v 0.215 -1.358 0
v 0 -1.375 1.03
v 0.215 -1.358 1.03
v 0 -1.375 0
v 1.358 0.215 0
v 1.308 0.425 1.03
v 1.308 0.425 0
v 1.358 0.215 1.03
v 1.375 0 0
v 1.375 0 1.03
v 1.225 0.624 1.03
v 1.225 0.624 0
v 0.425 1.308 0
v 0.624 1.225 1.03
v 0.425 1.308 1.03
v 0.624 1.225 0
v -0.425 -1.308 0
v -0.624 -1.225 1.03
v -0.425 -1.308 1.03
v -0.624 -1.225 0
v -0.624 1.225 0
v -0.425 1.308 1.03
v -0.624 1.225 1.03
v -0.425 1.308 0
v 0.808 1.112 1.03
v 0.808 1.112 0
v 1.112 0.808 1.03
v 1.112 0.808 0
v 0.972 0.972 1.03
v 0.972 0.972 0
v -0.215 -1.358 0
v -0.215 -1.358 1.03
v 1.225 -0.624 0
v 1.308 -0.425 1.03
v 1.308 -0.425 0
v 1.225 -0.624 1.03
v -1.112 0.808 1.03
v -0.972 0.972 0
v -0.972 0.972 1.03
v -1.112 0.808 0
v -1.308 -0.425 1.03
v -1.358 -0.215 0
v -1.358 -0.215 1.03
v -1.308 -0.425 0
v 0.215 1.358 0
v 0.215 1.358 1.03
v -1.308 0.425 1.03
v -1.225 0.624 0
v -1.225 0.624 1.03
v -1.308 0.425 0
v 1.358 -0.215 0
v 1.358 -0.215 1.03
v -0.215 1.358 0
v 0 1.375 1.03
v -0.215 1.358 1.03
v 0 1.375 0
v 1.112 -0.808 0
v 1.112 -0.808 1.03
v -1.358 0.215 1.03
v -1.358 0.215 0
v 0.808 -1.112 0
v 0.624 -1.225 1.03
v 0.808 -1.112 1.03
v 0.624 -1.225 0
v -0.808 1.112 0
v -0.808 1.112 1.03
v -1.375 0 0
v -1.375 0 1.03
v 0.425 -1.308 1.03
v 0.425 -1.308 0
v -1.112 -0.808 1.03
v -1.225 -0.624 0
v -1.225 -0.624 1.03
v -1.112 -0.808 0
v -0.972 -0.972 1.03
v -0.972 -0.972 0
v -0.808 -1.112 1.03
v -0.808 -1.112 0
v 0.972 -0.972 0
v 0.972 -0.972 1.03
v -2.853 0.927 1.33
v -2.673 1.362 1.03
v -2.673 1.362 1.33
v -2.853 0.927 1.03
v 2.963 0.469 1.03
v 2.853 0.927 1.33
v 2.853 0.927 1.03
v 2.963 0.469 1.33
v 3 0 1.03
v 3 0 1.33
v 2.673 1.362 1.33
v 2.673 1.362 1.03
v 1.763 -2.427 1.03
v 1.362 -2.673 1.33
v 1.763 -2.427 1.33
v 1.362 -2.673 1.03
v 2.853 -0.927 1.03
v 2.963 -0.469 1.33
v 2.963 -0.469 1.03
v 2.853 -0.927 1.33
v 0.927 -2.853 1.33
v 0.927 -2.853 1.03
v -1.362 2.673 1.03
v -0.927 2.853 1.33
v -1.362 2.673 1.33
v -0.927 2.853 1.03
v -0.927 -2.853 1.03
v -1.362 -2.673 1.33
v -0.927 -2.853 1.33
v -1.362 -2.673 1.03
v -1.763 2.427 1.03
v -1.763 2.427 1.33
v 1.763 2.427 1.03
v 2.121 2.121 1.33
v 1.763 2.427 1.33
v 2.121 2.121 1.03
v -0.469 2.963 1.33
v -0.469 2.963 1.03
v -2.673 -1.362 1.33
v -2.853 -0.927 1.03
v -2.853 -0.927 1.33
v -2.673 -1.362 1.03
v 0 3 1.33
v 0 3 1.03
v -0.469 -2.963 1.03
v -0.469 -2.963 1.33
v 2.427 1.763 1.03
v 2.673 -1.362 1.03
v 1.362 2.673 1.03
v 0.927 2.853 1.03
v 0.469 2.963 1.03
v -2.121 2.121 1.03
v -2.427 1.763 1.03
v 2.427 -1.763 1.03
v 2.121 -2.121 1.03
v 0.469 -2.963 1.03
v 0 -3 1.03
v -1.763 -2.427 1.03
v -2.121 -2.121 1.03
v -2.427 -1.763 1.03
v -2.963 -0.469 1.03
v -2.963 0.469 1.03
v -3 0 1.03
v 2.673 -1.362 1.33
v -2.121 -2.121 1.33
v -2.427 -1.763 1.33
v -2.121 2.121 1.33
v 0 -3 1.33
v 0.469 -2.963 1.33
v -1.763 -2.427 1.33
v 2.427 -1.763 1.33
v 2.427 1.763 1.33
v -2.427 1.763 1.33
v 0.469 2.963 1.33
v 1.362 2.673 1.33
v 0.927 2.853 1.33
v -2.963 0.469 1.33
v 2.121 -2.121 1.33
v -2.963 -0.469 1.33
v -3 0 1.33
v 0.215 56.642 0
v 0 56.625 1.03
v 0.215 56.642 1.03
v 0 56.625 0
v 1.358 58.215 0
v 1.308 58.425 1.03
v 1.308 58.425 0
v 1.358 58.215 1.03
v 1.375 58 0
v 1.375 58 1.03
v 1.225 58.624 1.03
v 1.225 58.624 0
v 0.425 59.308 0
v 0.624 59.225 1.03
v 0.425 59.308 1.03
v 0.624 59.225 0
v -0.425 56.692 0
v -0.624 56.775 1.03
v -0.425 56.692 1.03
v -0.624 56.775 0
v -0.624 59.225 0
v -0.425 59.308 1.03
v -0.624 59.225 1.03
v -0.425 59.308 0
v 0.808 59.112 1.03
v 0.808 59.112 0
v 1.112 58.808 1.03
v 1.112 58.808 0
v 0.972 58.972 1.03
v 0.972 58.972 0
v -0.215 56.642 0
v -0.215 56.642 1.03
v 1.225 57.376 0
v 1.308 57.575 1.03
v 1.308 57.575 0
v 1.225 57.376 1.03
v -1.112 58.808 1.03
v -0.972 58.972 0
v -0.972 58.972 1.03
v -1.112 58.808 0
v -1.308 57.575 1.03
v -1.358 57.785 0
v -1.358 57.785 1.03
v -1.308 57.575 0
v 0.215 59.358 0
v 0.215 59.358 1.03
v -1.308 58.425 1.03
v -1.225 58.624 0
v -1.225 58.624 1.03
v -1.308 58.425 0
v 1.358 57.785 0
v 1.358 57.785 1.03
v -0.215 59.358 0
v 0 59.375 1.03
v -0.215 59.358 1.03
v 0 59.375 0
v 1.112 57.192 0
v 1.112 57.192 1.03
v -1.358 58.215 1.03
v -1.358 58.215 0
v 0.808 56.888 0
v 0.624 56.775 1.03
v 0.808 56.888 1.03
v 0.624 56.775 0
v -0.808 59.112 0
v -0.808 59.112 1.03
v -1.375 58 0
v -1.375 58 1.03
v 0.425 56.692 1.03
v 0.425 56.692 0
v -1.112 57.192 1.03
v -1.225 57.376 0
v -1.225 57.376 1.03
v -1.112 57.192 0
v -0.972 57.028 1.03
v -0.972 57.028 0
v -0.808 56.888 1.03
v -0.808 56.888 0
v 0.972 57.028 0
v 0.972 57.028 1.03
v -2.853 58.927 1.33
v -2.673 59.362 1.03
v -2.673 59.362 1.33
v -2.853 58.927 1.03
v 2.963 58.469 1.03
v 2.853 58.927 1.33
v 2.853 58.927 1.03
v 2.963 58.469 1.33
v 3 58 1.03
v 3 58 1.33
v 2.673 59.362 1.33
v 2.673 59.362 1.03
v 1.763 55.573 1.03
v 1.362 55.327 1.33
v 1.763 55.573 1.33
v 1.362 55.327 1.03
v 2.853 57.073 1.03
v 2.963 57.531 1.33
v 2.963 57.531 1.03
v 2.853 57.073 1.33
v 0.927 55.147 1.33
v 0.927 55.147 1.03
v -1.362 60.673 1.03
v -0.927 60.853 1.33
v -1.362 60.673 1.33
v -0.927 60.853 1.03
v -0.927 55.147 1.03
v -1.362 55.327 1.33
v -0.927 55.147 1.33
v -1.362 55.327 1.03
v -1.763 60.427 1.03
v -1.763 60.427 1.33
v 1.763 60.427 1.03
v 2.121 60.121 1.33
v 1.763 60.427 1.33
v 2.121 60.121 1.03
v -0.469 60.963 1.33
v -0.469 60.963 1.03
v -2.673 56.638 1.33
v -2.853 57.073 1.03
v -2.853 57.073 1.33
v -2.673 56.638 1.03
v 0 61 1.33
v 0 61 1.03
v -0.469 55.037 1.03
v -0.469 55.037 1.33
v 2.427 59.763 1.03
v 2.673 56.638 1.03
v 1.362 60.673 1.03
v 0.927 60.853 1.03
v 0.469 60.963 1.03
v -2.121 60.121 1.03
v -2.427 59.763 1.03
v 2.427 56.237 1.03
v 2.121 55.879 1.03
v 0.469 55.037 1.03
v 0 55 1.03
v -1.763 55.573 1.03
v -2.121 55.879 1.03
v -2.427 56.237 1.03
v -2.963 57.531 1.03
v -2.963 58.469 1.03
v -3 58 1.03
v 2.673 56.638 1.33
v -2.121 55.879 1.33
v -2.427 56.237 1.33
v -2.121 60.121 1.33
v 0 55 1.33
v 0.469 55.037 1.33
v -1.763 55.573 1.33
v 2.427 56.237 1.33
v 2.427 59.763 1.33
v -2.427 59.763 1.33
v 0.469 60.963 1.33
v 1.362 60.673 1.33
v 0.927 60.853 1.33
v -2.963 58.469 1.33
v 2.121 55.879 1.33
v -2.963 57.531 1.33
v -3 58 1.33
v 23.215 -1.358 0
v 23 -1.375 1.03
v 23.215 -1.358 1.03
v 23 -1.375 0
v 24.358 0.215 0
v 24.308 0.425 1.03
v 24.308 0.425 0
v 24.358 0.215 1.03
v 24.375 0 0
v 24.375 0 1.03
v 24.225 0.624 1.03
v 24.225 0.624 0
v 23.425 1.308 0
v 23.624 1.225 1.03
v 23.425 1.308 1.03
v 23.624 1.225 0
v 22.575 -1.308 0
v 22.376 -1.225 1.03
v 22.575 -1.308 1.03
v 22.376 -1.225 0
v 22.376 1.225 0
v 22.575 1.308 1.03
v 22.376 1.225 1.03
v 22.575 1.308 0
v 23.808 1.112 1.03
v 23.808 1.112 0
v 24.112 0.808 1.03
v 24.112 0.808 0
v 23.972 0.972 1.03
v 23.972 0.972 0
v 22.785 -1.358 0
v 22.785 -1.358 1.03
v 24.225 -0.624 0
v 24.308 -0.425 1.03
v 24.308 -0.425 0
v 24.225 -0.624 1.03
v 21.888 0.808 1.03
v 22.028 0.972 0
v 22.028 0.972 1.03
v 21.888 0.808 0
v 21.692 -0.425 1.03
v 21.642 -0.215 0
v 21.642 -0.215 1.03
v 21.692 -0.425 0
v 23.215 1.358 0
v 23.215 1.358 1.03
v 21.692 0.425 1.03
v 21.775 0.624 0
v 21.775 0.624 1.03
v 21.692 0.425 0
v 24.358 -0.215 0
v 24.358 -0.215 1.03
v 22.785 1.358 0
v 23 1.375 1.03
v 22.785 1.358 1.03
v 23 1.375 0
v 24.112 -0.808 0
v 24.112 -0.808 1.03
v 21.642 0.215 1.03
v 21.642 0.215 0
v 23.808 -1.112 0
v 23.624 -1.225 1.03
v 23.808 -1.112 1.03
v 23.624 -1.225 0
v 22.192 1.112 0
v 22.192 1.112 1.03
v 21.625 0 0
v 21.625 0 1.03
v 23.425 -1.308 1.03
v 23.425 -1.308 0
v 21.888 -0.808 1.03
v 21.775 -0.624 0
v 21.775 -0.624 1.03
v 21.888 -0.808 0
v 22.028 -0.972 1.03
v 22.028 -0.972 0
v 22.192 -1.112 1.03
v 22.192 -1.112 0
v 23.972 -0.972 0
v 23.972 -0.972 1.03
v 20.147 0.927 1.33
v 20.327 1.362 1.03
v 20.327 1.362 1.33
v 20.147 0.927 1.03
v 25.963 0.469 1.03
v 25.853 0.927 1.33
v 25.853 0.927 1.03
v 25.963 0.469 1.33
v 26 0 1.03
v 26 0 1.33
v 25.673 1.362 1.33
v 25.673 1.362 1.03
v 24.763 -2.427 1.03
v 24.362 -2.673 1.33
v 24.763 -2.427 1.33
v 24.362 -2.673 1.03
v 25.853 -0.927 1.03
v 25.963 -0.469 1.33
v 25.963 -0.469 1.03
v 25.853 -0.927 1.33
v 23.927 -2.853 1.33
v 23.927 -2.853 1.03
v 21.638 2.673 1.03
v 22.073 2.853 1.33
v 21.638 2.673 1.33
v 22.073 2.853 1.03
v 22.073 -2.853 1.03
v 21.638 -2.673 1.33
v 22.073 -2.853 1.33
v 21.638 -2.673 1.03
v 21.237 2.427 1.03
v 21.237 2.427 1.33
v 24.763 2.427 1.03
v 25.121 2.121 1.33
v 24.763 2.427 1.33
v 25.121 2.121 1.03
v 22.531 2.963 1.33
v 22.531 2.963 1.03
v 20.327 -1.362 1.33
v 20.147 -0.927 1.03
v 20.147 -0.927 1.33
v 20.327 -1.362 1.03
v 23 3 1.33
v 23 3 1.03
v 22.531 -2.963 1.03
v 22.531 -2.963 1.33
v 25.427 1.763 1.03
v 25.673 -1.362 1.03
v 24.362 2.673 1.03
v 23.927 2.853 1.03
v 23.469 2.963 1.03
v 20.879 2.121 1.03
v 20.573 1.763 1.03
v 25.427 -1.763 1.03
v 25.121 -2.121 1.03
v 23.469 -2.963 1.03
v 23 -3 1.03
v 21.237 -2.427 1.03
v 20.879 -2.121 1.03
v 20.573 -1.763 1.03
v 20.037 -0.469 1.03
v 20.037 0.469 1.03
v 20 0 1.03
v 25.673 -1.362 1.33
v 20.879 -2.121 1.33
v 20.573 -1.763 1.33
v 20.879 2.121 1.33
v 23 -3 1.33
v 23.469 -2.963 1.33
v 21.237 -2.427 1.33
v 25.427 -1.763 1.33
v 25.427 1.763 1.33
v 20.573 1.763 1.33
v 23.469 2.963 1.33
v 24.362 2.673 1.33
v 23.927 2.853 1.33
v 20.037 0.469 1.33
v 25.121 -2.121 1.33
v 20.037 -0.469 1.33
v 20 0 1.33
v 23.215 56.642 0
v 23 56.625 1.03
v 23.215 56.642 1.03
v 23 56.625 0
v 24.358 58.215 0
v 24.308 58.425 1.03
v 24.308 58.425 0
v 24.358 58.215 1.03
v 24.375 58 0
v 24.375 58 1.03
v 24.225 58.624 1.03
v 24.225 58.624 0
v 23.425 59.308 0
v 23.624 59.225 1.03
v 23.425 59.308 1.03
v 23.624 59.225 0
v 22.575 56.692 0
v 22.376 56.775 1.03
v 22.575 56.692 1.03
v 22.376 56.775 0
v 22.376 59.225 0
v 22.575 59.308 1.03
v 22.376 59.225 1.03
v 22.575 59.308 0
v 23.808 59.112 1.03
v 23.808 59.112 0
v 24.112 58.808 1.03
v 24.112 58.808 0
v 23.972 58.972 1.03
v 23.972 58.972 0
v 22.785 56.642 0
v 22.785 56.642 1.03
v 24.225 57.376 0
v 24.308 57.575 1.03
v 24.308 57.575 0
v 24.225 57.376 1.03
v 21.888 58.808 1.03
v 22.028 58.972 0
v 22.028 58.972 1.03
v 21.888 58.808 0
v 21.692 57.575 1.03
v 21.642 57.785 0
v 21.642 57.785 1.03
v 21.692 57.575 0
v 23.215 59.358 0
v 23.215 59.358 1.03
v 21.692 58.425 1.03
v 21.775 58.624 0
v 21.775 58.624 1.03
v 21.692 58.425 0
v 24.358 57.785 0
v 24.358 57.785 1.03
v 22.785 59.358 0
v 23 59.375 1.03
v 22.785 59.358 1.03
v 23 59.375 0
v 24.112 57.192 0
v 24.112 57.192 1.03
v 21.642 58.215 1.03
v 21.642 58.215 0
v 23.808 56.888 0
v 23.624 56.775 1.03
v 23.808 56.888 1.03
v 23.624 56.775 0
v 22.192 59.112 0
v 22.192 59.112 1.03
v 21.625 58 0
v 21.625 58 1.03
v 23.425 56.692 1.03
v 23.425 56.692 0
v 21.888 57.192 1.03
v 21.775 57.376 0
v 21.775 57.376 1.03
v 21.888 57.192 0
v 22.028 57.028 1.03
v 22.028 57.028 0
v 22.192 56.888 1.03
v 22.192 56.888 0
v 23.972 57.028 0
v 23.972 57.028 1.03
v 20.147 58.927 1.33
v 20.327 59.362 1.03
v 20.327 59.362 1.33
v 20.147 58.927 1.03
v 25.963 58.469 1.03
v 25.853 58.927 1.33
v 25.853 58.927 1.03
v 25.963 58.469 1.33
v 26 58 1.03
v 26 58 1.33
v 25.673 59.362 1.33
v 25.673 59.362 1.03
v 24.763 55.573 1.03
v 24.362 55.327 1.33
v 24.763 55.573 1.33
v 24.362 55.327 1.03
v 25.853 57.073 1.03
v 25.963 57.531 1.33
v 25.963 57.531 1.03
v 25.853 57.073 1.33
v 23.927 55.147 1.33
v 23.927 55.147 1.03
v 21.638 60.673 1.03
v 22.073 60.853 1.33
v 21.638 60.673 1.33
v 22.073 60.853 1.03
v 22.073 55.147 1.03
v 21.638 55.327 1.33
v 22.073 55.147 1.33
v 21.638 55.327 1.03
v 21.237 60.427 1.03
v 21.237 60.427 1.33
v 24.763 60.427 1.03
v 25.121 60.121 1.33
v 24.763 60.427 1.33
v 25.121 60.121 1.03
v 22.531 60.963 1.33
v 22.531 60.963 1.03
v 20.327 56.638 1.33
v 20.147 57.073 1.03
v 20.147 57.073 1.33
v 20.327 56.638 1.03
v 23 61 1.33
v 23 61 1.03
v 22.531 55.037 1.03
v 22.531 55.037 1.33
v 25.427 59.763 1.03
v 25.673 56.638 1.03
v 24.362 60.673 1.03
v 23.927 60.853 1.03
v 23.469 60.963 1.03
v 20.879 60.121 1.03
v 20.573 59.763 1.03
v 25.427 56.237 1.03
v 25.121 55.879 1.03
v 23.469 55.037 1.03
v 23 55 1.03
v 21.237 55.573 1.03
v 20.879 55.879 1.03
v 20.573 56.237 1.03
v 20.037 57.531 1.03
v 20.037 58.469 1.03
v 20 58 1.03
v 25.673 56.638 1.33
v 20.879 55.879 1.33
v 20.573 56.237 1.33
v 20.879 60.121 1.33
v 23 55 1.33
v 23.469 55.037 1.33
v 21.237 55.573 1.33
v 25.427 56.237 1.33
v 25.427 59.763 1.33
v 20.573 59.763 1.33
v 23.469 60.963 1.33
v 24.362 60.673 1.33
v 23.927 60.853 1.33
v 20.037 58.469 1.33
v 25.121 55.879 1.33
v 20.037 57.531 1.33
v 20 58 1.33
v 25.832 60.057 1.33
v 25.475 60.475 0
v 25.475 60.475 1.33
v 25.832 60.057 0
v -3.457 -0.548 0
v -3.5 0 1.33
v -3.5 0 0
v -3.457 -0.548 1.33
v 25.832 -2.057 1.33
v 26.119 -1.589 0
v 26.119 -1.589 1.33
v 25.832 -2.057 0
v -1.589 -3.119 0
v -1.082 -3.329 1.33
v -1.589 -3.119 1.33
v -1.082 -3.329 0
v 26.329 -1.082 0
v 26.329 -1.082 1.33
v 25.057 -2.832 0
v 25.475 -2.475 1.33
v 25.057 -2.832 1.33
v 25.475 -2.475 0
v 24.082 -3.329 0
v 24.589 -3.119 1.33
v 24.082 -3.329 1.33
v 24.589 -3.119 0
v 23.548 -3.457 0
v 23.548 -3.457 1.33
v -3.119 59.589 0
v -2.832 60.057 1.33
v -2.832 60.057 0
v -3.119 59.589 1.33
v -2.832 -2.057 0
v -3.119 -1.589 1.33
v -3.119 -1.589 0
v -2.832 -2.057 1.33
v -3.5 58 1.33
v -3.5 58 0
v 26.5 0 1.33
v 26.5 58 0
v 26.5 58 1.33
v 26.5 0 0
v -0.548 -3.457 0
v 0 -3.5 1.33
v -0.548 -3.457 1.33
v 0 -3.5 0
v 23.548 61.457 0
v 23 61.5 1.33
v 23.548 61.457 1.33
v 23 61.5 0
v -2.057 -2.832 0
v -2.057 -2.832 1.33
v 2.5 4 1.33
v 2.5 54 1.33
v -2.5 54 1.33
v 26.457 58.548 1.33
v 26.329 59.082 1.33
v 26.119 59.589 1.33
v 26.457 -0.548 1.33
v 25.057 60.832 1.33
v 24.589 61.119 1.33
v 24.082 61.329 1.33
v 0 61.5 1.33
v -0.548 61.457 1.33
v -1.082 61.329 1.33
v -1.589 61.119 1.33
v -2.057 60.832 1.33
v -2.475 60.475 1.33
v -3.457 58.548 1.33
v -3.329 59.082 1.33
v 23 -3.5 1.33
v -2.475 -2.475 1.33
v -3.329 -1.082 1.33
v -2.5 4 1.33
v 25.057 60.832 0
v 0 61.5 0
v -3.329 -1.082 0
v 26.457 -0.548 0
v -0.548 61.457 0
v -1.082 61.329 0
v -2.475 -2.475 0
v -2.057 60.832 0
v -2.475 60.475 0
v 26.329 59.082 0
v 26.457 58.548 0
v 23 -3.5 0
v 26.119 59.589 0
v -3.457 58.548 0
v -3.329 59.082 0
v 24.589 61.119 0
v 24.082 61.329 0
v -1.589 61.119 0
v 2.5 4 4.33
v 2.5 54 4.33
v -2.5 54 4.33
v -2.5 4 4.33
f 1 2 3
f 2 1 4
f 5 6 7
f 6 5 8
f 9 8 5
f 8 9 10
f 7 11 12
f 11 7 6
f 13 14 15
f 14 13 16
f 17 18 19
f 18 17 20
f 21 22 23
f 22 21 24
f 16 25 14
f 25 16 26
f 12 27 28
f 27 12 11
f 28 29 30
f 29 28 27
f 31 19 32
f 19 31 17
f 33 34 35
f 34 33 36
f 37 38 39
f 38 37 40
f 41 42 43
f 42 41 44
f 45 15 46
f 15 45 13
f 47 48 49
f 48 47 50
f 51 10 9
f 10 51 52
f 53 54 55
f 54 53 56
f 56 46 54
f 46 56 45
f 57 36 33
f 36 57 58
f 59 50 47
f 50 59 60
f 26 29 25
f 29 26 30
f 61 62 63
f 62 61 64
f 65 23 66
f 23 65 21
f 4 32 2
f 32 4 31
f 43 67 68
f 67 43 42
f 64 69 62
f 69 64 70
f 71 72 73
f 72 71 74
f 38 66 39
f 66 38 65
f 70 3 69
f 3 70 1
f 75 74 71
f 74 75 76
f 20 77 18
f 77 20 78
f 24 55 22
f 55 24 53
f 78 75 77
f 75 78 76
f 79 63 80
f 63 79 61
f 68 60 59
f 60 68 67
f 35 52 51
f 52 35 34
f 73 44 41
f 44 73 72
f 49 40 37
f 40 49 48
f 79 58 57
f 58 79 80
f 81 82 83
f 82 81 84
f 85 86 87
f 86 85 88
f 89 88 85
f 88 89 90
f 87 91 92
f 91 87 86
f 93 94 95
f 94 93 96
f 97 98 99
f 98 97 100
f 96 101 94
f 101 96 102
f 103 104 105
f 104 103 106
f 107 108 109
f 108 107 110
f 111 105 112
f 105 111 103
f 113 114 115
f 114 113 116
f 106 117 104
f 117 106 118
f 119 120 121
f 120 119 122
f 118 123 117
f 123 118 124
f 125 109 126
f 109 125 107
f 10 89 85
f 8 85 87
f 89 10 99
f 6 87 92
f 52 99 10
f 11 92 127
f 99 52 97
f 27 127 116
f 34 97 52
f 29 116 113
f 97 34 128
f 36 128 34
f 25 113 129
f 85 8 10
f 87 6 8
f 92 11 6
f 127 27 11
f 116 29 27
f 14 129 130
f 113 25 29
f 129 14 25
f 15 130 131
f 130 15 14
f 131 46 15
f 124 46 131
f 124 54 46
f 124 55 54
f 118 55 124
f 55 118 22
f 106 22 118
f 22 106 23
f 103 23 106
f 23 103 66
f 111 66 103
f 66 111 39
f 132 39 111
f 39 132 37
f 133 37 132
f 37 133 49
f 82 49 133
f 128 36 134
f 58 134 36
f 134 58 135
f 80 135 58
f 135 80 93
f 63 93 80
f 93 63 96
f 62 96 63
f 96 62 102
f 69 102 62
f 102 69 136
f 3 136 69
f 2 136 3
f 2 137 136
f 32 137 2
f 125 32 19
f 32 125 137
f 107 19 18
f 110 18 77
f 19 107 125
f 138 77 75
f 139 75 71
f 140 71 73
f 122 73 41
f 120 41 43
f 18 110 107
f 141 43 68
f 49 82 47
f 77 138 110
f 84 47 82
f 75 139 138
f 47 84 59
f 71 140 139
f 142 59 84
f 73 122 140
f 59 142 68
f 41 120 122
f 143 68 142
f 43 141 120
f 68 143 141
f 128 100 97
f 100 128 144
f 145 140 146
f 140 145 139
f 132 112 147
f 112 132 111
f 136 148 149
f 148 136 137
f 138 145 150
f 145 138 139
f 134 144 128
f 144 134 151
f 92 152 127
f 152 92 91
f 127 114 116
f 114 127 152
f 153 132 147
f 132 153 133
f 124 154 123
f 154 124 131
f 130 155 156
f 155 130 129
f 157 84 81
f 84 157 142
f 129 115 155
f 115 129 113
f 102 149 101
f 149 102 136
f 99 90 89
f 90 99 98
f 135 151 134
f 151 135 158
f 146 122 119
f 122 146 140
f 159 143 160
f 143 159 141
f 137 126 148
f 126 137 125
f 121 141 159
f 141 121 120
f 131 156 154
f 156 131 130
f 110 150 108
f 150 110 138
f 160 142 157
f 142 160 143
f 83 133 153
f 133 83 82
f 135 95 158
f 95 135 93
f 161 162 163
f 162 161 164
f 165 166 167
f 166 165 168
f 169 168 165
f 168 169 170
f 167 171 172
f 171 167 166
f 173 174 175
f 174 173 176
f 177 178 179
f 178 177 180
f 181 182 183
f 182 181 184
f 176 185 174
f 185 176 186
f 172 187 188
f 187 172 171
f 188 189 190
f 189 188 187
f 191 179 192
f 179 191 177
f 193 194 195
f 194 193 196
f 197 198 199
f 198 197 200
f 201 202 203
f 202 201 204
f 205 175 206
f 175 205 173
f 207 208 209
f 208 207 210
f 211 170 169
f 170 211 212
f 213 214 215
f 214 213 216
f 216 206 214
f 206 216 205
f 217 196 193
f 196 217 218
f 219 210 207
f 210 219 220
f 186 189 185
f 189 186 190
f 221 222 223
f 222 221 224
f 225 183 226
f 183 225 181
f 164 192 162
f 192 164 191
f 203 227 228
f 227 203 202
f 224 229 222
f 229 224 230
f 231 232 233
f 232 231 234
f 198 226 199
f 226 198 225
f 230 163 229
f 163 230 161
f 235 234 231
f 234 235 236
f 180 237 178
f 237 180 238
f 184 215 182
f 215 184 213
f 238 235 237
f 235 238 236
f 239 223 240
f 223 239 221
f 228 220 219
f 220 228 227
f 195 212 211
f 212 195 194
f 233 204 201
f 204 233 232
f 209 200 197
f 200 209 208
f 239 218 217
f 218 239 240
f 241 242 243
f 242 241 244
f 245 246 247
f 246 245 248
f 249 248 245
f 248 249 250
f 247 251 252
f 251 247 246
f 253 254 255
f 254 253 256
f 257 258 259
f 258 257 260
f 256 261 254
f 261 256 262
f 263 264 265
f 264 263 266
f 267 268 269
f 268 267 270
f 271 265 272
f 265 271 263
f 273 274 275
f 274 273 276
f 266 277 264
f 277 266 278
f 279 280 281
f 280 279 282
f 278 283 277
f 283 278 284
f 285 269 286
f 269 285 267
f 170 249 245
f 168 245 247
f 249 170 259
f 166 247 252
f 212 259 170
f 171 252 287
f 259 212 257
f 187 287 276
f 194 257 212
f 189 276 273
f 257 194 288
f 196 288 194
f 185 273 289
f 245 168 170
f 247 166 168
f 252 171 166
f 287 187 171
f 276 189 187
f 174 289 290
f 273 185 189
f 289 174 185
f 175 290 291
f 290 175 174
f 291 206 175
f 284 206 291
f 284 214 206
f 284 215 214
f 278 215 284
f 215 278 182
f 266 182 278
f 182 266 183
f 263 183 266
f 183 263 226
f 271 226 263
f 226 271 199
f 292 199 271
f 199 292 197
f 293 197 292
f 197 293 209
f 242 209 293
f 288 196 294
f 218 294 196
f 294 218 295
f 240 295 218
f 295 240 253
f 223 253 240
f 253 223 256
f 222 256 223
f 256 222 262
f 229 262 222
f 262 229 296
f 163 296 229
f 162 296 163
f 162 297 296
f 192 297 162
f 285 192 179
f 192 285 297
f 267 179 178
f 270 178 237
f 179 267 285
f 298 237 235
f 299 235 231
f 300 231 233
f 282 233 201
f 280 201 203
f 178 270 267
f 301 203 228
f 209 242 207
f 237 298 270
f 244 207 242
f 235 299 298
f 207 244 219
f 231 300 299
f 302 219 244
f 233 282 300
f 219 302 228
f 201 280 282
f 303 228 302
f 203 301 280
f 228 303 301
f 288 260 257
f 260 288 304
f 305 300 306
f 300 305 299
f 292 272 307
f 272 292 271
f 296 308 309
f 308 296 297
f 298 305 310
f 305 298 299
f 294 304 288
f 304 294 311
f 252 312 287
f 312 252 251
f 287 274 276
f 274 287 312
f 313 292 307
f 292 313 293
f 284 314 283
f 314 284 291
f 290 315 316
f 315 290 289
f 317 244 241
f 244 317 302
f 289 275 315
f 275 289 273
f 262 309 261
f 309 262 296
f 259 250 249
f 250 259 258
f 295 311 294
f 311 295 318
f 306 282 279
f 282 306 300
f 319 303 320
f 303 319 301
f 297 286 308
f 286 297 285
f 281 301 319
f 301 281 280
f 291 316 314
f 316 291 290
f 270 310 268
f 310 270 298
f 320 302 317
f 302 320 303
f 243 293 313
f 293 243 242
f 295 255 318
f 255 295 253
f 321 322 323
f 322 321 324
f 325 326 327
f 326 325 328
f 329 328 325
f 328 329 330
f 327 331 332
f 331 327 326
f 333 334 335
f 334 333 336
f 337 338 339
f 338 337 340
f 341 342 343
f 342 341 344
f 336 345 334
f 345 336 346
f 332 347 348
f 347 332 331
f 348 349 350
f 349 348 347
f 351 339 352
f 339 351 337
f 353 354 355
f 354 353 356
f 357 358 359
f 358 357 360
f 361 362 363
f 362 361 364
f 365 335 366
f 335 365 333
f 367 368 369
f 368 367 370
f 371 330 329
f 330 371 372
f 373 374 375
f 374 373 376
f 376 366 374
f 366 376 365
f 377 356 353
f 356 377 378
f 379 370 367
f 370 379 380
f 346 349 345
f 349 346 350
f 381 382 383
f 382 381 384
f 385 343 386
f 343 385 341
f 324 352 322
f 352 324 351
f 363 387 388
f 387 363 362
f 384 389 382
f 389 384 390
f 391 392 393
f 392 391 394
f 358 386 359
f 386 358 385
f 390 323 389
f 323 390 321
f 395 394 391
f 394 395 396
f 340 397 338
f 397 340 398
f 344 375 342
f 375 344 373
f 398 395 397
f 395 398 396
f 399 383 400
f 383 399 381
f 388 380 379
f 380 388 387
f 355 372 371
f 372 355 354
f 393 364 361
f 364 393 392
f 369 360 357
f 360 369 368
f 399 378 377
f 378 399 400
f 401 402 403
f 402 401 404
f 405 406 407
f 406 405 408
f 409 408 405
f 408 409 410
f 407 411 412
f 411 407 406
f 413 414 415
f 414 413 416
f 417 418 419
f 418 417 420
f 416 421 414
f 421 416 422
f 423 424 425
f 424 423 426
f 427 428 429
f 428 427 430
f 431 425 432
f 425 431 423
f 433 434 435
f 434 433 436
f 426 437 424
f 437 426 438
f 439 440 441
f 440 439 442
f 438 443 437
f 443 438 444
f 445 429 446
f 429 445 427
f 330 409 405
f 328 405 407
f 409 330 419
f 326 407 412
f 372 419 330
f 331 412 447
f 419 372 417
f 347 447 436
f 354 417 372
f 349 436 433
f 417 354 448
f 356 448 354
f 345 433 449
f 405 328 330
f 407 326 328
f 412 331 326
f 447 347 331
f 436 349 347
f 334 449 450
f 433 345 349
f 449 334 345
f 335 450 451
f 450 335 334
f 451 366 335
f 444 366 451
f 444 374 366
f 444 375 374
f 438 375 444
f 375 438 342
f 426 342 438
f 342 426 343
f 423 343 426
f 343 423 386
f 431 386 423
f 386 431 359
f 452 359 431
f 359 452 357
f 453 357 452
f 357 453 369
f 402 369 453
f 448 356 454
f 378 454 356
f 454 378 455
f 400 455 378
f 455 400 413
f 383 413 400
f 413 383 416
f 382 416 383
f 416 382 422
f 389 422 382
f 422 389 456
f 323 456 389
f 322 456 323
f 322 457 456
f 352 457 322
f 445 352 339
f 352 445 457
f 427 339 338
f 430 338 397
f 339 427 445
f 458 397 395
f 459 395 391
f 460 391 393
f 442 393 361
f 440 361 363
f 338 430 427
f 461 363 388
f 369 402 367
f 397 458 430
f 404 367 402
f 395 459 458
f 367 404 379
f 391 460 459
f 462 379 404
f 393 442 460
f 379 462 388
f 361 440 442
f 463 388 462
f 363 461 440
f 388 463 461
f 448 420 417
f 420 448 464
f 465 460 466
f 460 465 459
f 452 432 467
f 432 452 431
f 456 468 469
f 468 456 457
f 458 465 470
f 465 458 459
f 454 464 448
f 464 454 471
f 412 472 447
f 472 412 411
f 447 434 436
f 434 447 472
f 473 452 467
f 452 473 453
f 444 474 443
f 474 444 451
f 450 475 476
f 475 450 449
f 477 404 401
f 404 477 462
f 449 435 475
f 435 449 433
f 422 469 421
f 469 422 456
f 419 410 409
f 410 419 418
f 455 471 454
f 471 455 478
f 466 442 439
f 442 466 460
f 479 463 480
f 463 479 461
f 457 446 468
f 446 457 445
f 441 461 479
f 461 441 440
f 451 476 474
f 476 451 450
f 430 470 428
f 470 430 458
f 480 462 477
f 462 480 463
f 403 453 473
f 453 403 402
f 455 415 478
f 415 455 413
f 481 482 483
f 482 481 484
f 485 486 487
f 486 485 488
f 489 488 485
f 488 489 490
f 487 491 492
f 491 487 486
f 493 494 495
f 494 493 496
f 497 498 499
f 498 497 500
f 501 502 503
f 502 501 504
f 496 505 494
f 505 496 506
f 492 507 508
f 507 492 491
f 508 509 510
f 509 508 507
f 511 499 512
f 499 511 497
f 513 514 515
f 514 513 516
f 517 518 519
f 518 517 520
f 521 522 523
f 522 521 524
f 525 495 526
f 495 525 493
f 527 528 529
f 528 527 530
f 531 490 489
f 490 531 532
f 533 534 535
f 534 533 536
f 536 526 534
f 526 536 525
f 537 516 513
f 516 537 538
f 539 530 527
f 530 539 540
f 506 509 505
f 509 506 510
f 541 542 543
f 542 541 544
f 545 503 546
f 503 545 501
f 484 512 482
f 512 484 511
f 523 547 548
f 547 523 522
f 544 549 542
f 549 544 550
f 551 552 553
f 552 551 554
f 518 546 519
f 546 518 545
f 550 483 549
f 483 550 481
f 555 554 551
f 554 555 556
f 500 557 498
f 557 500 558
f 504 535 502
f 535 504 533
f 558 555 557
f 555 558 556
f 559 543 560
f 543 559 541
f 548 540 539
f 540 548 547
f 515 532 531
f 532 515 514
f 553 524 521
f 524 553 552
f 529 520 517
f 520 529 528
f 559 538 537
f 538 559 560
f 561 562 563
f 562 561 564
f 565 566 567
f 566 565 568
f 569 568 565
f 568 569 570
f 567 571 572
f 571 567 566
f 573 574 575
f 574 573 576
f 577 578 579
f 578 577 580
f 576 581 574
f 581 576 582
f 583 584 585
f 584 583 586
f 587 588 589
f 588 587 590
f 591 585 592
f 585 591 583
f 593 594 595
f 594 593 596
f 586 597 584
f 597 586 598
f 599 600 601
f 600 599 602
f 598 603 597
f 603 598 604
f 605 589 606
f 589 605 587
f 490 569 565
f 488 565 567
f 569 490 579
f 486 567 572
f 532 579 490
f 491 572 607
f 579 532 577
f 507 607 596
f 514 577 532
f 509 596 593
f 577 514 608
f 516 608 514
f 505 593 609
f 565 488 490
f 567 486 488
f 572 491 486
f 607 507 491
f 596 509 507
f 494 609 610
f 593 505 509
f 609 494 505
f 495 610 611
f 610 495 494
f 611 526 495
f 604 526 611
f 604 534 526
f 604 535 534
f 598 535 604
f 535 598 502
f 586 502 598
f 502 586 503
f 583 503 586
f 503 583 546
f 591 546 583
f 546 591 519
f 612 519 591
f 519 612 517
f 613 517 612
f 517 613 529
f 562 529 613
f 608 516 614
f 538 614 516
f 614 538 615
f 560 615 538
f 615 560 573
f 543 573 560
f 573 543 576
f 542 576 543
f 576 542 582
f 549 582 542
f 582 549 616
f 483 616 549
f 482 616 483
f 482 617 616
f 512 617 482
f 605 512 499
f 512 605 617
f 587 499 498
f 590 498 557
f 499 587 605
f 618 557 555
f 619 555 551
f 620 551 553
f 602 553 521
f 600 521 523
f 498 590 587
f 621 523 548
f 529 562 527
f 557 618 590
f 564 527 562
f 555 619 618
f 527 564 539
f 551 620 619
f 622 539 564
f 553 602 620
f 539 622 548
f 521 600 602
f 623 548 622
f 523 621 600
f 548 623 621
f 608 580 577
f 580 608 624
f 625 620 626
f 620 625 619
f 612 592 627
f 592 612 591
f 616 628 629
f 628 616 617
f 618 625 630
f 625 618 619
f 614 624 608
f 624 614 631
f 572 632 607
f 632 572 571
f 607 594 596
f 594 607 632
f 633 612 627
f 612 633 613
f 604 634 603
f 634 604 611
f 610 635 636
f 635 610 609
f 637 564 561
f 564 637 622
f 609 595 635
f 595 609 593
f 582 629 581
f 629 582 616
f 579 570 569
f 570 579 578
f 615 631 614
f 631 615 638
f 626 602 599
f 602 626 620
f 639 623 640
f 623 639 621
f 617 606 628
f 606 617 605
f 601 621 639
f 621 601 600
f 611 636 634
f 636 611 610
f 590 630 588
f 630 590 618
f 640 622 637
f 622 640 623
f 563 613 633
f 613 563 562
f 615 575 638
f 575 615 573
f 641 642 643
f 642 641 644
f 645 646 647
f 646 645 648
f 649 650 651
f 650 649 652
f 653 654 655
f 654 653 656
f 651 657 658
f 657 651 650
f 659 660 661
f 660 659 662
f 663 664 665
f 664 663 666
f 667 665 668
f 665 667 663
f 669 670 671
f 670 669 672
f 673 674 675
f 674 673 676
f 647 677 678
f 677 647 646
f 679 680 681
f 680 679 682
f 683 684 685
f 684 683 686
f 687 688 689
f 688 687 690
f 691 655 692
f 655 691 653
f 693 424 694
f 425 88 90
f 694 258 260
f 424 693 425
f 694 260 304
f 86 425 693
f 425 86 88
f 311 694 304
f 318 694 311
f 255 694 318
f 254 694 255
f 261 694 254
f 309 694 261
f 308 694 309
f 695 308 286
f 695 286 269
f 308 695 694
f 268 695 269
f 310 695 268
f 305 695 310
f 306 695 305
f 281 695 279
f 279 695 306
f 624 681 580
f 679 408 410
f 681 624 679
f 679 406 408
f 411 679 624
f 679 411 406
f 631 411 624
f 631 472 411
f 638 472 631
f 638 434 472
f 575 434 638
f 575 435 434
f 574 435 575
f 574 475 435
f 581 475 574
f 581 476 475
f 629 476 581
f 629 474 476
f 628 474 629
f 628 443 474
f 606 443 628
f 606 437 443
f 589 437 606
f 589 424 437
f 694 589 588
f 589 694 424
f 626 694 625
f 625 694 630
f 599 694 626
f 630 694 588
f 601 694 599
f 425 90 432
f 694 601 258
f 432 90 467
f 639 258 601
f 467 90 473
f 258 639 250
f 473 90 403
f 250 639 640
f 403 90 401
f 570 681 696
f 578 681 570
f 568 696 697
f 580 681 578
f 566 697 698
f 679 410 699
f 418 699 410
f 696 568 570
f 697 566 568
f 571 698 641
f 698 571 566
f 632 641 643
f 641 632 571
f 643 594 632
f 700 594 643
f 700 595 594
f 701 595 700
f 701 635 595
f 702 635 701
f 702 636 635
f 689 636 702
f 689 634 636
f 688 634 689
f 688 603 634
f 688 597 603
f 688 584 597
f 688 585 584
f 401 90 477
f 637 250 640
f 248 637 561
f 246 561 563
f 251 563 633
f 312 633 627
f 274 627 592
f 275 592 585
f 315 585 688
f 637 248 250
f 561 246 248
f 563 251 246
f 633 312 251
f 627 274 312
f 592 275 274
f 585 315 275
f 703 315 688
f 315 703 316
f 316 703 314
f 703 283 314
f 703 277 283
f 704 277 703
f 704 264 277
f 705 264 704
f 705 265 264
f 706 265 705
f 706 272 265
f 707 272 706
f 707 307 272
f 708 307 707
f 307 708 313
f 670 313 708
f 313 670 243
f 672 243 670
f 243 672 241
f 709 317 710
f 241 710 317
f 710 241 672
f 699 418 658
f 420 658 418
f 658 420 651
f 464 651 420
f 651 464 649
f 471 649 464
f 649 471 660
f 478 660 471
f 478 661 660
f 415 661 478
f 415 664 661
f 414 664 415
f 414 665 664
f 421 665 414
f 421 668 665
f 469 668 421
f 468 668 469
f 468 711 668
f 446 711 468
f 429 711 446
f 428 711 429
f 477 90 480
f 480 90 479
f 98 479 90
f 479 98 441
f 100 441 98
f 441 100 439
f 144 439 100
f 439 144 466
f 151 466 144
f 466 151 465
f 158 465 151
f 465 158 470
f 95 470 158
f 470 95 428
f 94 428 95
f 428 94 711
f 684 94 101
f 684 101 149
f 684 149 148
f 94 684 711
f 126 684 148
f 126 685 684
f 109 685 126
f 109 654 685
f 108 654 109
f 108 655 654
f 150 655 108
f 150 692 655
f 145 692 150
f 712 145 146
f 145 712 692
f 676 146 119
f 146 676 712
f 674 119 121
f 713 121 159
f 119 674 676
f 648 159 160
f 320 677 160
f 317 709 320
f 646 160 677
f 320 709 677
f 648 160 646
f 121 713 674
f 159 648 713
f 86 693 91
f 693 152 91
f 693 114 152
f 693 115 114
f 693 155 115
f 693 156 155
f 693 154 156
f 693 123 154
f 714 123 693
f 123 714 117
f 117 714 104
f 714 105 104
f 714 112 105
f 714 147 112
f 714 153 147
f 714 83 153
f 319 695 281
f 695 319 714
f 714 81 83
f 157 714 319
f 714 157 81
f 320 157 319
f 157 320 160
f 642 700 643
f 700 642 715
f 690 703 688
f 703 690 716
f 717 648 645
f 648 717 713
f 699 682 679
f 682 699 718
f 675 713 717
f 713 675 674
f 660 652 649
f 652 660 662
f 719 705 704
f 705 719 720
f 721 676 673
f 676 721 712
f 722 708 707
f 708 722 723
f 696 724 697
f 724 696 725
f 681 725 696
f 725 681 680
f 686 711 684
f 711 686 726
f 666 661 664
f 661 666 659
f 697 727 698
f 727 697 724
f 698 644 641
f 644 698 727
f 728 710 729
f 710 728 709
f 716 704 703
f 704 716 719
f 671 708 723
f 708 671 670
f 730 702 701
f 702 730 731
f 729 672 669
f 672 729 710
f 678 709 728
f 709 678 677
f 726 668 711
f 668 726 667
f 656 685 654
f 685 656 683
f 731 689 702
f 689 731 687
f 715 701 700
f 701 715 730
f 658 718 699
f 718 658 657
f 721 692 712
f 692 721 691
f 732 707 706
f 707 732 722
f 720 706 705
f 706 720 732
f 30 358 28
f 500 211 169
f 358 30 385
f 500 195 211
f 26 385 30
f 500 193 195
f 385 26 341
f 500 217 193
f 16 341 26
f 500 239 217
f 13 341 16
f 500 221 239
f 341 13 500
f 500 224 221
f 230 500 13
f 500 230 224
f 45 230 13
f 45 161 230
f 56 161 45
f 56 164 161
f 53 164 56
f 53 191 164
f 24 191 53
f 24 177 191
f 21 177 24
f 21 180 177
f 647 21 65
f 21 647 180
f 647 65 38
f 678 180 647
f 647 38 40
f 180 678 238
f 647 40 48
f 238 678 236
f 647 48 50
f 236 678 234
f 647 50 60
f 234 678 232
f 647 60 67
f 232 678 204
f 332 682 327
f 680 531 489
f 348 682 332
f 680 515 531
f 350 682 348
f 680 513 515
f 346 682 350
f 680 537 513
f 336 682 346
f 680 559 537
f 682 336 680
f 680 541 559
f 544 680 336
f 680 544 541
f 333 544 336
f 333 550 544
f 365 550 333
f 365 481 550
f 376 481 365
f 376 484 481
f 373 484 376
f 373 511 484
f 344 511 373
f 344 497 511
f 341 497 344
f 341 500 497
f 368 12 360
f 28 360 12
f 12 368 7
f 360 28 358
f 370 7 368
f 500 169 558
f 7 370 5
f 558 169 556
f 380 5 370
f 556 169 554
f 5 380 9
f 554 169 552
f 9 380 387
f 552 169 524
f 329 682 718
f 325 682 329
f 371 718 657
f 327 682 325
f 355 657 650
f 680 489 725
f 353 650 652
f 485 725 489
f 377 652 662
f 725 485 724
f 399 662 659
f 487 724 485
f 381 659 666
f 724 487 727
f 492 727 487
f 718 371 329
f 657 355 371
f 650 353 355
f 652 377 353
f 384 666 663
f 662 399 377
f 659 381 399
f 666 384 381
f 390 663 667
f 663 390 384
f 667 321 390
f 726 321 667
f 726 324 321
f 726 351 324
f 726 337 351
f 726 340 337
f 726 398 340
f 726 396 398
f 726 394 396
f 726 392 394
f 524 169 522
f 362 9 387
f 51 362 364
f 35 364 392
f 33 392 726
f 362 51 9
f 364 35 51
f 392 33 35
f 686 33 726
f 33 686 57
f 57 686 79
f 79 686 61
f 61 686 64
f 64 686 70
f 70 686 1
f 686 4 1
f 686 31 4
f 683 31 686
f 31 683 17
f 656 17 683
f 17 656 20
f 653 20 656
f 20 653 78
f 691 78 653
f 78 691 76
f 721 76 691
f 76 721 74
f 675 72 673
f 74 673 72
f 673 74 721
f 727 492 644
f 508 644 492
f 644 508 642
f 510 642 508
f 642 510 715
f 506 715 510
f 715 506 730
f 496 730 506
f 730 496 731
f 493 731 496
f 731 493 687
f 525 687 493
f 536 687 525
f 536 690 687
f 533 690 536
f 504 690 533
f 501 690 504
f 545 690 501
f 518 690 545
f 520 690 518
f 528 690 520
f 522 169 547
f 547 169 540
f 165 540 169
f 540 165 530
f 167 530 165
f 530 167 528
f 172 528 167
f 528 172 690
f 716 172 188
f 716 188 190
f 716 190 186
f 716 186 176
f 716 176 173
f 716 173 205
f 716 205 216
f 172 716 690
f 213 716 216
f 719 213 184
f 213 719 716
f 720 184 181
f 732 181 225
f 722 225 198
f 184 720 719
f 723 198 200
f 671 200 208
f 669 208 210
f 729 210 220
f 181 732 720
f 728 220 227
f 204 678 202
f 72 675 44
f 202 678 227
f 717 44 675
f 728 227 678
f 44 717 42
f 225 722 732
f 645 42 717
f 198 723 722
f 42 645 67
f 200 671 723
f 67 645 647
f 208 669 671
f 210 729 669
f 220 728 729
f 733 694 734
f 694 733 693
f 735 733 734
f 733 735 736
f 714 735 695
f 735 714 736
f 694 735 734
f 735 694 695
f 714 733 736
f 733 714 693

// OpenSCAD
$fn=40;

boardThickness=1.33;

miniusbWidth=5.59;
miniusbLength=8.04;
miniusbboardThickness=4.22-boardThickness;
miniusbOverHang=-1.9;	// 1.09

hdmiWidth=11.37;
hdmiLength=15.07;
hdmiboardThickness=7.86-boardThickness;
hdmiOverHang=-1.9;		//1.66

union() {
    difference() {
        linear_extrude(boardThickness) minkowski() {
            square([23,58]);
            circle(r=3.5);
        }
        screw_hole();
        translate([0,58,0]) screw_hole();
        translate([23,0,0]) screw_hole();
        translate([23,58,0]) screw_hole();
    }
    // GPIO
    translate([-2.5,4,boardThickness]) cube([5,50,3]);
    
    // micro HDMI
    
    // USB A
    
    // USB B
    
    // MicroSD
}

module screw_hole() {
    translate([0,0,-0.1]) union() {
        cylinder(d=2.75,h=boardThickness+0.2);
        translate([0,0,boardThickness-0.2]) cylinder(d=6,h=0.7);
    }
}
